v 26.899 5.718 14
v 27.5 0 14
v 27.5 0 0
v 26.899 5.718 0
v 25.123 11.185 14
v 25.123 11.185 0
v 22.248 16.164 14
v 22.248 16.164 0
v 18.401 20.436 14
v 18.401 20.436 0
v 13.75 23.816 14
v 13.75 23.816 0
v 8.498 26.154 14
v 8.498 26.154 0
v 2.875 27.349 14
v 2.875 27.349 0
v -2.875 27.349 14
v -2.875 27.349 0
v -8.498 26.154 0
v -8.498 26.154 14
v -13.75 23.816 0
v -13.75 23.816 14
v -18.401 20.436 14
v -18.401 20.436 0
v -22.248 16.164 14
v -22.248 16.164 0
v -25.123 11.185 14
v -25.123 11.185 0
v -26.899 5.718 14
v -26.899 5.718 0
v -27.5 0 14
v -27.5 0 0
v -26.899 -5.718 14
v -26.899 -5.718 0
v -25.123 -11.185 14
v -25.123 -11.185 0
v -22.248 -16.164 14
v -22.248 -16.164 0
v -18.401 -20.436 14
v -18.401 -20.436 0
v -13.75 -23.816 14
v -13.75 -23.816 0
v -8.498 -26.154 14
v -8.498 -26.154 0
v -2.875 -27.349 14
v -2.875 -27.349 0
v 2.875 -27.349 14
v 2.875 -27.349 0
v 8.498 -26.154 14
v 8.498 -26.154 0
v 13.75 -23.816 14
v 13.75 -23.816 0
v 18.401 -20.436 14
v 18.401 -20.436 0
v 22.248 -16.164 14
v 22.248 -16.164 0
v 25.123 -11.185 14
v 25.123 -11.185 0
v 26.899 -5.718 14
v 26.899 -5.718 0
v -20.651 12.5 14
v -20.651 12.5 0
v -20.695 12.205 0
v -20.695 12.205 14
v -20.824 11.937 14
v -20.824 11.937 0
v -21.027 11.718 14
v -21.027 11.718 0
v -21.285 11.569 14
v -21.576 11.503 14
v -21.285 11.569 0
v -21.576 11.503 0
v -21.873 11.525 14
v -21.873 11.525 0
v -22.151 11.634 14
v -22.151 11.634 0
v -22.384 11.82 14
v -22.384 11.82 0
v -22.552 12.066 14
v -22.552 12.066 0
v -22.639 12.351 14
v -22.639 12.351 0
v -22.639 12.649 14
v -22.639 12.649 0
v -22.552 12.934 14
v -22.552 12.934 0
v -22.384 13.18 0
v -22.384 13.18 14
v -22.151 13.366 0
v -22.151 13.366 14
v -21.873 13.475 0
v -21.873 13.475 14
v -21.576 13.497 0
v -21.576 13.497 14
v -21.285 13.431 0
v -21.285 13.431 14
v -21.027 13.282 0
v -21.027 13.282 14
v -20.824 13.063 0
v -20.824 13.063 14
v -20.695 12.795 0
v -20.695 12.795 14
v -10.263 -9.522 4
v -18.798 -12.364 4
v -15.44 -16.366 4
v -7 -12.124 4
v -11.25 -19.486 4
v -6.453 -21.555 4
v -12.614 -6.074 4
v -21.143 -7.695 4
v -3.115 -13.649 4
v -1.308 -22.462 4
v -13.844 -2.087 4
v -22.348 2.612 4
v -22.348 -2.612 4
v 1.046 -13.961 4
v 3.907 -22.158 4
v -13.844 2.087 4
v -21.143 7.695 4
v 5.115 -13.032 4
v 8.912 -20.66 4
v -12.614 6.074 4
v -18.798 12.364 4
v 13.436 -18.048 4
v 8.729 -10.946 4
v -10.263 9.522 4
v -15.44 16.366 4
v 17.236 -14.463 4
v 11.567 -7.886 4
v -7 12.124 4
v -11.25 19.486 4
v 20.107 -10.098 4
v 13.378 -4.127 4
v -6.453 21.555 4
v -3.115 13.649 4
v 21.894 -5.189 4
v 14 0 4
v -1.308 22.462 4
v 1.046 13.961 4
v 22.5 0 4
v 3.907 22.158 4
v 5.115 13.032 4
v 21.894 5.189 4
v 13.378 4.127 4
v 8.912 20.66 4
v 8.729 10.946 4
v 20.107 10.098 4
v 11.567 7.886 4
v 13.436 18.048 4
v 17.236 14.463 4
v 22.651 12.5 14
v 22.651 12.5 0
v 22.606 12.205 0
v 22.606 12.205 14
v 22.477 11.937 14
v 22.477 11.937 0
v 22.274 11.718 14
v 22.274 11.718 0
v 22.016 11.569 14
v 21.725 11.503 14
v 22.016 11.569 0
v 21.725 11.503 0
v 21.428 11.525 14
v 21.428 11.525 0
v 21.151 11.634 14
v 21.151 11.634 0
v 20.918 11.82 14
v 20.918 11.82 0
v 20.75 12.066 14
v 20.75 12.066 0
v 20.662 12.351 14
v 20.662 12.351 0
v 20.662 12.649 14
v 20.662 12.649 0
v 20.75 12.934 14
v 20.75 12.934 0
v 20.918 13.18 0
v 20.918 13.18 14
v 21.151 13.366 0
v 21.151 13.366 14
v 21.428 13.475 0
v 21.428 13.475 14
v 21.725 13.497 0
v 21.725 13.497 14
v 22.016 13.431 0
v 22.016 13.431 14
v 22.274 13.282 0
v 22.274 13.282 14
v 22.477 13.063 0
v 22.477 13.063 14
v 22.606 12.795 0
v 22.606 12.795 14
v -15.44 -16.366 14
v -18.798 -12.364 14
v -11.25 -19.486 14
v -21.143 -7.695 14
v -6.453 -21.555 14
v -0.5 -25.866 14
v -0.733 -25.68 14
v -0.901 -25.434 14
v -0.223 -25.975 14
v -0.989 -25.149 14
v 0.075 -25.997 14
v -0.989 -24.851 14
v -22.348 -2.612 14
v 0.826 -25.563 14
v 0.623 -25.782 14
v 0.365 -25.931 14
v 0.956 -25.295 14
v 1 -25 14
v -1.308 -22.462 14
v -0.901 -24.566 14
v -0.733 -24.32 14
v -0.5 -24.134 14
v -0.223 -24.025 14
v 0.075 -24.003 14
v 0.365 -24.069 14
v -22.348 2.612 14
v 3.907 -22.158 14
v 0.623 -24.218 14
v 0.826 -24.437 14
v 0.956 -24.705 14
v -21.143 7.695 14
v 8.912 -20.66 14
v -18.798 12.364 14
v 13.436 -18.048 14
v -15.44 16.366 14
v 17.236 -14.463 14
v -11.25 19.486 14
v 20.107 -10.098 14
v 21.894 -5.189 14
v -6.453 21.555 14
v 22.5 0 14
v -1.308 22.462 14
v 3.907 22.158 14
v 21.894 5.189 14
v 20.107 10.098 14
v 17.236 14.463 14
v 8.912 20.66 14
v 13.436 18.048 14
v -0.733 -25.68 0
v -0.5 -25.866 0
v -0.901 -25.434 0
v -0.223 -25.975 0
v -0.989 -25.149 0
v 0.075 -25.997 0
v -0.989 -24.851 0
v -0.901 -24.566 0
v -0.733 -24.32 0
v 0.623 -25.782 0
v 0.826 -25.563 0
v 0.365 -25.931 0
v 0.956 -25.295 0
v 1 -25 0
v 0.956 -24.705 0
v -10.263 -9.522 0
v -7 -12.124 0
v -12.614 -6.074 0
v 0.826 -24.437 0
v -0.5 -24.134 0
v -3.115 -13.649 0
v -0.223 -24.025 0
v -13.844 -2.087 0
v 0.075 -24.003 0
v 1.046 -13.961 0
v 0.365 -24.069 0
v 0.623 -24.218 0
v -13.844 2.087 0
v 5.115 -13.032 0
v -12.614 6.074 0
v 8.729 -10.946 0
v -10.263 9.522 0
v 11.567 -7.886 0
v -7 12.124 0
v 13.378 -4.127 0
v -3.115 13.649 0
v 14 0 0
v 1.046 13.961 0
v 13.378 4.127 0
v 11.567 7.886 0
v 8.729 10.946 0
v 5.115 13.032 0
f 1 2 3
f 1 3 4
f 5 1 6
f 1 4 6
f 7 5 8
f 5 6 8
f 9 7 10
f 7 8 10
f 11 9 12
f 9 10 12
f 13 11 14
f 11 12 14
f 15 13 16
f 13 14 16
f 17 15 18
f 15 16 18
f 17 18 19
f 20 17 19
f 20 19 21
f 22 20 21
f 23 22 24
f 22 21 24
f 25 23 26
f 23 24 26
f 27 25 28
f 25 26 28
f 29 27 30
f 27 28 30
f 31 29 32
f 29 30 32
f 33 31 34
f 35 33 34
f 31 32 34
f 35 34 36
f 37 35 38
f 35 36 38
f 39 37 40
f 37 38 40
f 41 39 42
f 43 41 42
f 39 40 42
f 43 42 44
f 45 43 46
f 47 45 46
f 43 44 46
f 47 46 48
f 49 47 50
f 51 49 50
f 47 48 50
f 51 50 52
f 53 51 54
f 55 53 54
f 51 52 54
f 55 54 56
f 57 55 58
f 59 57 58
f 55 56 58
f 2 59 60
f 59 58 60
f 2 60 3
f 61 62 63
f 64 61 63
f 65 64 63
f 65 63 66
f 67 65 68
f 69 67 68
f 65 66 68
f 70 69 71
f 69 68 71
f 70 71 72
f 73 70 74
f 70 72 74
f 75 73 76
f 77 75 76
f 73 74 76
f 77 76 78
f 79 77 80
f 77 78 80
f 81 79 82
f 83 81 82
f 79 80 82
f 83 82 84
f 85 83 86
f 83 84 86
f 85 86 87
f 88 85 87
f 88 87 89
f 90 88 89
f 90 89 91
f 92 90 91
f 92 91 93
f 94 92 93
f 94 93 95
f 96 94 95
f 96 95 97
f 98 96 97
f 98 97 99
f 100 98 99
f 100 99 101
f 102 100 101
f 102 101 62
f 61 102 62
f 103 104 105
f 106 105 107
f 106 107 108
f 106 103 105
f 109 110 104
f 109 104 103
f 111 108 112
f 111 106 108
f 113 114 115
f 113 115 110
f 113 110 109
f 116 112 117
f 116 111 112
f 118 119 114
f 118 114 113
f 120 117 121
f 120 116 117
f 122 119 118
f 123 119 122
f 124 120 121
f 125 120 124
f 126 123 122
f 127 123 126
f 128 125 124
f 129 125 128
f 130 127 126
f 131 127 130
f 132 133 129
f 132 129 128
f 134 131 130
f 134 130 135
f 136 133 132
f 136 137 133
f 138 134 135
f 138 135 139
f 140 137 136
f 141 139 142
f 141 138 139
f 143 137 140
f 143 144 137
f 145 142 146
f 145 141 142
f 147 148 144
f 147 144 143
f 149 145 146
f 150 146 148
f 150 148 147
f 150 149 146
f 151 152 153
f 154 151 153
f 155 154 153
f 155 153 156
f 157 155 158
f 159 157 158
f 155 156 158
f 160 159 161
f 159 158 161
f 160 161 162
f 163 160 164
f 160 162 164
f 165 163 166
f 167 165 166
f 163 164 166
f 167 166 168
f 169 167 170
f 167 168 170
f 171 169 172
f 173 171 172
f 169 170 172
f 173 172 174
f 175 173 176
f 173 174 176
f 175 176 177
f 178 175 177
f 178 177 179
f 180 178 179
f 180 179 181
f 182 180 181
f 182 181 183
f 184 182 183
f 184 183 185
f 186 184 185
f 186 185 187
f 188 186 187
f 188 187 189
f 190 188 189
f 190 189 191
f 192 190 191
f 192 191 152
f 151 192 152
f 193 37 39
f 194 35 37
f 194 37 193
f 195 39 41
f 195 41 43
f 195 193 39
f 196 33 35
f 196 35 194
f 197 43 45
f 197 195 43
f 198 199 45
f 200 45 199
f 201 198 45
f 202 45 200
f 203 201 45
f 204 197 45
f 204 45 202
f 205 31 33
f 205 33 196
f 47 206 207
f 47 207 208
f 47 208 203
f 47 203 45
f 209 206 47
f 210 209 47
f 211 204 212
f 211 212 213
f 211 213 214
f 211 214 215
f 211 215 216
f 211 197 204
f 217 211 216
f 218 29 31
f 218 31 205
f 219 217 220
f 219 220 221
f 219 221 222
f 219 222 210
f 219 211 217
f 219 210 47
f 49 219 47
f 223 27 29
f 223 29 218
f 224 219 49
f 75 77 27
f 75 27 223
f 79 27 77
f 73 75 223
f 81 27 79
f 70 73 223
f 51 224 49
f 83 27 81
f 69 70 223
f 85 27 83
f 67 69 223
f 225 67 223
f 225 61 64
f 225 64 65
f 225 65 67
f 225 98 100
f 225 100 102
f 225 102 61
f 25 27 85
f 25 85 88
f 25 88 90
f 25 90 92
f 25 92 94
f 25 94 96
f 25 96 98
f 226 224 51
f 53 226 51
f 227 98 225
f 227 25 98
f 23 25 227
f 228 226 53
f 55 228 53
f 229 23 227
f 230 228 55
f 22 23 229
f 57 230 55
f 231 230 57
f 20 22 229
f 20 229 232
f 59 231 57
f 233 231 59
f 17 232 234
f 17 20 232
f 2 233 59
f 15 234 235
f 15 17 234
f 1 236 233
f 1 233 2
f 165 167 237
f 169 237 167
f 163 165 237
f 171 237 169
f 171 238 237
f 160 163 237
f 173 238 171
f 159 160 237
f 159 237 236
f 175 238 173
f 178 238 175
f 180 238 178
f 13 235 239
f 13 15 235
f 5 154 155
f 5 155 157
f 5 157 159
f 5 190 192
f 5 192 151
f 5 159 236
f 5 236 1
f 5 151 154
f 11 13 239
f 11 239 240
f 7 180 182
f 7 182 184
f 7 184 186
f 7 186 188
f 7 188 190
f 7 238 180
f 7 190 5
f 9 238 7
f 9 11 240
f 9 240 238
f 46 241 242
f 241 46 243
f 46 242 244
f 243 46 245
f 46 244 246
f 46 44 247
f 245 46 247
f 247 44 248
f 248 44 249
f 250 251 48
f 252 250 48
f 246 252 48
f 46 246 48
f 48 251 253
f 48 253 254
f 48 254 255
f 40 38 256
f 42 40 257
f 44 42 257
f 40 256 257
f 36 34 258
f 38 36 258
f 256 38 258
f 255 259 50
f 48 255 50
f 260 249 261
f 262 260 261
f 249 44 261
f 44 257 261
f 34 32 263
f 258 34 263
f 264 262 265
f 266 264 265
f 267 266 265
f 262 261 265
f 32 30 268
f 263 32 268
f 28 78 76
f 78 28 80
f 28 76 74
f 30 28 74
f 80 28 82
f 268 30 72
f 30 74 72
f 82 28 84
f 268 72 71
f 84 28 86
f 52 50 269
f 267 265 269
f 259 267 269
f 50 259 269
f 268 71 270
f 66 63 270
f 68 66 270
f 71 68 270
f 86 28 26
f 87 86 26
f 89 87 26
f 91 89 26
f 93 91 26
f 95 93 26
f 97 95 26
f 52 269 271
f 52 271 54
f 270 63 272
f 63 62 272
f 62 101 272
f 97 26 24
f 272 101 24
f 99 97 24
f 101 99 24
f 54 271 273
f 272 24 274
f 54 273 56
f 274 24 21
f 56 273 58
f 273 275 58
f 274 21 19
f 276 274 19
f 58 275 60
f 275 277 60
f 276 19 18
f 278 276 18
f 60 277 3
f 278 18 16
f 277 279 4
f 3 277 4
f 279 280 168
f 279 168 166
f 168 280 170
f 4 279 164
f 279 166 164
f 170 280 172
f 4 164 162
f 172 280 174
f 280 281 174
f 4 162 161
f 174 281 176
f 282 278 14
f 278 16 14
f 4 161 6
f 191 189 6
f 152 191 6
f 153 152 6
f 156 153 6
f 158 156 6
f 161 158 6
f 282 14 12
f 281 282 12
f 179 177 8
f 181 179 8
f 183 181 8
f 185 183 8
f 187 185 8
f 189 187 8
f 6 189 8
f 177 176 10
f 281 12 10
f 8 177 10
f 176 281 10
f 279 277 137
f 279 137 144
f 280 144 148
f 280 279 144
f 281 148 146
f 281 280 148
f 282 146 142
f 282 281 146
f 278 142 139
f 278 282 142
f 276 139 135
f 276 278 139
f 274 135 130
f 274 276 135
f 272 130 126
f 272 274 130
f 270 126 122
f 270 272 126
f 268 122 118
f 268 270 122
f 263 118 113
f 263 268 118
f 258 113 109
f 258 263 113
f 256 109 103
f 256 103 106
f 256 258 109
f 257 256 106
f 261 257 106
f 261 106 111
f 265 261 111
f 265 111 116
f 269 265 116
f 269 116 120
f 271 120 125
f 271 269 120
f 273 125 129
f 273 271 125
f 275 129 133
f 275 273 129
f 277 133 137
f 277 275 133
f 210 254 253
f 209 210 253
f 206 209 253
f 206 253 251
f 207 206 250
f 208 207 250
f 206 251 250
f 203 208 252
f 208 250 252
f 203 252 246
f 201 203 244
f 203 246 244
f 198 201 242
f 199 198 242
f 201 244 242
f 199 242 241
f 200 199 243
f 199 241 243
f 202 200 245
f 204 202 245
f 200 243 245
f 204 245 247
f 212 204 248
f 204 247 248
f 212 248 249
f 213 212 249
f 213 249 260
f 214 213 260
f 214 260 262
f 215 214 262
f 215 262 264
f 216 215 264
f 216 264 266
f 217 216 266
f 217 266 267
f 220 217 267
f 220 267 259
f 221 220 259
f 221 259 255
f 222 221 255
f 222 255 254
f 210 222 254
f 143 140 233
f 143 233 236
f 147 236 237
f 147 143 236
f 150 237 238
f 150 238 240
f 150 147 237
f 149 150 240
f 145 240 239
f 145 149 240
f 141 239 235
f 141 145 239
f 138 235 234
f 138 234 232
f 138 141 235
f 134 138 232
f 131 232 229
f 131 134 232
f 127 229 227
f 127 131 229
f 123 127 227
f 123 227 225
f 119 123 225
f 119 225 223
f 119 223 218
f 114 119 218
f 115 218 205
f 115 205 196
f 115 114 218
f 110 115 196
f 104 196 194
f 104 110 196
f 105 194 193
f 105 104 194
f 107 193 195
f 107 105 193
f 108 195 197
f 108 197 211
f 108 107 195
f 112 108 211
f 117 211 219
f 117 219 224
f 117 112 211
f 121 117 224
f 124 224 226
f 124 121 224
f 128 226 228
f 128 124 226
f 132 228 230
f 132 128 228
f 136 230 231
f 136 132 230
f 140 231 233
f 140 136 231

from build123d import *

# Parameters (mm, degrees)
SKETCH_R      = 27.5
SKETCH_R_2    = 14
PAD_DEPTH     = 4
SKETCH005_R   = 27.5
SKETCH005_R_2 = 22.5
PAD001_DEPTH  = 10
SKETCH006_R   = 1
POCKET_DEPTH  = 14.001


with BuildPart() as part:
    # Sketch → Pad (new body)
    with BuildSketch(Plane.XY):
        Circle(SKETCH_R)
        Circle(SKETCH_R_2, mode=Mode.SUBTRACT)
    extrude(amount=PAD_DEPTH)

    # Sketch005 (on Face4 of Pad) → Pad001 (join)
    with BuildSketch(Plane.XY.offset(4)):
        Circle(SKETCH005_R)
        Circle(SKETCH005_R_2, mode=Mode.SUBTRACT)
    extrude(amount=PAD001_DEPTH)

    # Sketch006 (on Face2 of Pad001) → Pocket (cut, through all)
    with BuildSketch(Plane(origin=(0, 0, 0), x_dir=(1, 0, 0), z_dir=(0, 0, -1))):
        with Locations((0, 25)):
            Circle(SKETCH006_R)
        with Locations((-21.650635, -12.5)):
            Circle(SKETCH006_R)
        with Locations((21.650635, -12.5)):
            Circle(SKETCH006_R)
    extrude(amount=-POCKET_DEPTH, mode=Mode.SUBTRACT)


solid = part.part
